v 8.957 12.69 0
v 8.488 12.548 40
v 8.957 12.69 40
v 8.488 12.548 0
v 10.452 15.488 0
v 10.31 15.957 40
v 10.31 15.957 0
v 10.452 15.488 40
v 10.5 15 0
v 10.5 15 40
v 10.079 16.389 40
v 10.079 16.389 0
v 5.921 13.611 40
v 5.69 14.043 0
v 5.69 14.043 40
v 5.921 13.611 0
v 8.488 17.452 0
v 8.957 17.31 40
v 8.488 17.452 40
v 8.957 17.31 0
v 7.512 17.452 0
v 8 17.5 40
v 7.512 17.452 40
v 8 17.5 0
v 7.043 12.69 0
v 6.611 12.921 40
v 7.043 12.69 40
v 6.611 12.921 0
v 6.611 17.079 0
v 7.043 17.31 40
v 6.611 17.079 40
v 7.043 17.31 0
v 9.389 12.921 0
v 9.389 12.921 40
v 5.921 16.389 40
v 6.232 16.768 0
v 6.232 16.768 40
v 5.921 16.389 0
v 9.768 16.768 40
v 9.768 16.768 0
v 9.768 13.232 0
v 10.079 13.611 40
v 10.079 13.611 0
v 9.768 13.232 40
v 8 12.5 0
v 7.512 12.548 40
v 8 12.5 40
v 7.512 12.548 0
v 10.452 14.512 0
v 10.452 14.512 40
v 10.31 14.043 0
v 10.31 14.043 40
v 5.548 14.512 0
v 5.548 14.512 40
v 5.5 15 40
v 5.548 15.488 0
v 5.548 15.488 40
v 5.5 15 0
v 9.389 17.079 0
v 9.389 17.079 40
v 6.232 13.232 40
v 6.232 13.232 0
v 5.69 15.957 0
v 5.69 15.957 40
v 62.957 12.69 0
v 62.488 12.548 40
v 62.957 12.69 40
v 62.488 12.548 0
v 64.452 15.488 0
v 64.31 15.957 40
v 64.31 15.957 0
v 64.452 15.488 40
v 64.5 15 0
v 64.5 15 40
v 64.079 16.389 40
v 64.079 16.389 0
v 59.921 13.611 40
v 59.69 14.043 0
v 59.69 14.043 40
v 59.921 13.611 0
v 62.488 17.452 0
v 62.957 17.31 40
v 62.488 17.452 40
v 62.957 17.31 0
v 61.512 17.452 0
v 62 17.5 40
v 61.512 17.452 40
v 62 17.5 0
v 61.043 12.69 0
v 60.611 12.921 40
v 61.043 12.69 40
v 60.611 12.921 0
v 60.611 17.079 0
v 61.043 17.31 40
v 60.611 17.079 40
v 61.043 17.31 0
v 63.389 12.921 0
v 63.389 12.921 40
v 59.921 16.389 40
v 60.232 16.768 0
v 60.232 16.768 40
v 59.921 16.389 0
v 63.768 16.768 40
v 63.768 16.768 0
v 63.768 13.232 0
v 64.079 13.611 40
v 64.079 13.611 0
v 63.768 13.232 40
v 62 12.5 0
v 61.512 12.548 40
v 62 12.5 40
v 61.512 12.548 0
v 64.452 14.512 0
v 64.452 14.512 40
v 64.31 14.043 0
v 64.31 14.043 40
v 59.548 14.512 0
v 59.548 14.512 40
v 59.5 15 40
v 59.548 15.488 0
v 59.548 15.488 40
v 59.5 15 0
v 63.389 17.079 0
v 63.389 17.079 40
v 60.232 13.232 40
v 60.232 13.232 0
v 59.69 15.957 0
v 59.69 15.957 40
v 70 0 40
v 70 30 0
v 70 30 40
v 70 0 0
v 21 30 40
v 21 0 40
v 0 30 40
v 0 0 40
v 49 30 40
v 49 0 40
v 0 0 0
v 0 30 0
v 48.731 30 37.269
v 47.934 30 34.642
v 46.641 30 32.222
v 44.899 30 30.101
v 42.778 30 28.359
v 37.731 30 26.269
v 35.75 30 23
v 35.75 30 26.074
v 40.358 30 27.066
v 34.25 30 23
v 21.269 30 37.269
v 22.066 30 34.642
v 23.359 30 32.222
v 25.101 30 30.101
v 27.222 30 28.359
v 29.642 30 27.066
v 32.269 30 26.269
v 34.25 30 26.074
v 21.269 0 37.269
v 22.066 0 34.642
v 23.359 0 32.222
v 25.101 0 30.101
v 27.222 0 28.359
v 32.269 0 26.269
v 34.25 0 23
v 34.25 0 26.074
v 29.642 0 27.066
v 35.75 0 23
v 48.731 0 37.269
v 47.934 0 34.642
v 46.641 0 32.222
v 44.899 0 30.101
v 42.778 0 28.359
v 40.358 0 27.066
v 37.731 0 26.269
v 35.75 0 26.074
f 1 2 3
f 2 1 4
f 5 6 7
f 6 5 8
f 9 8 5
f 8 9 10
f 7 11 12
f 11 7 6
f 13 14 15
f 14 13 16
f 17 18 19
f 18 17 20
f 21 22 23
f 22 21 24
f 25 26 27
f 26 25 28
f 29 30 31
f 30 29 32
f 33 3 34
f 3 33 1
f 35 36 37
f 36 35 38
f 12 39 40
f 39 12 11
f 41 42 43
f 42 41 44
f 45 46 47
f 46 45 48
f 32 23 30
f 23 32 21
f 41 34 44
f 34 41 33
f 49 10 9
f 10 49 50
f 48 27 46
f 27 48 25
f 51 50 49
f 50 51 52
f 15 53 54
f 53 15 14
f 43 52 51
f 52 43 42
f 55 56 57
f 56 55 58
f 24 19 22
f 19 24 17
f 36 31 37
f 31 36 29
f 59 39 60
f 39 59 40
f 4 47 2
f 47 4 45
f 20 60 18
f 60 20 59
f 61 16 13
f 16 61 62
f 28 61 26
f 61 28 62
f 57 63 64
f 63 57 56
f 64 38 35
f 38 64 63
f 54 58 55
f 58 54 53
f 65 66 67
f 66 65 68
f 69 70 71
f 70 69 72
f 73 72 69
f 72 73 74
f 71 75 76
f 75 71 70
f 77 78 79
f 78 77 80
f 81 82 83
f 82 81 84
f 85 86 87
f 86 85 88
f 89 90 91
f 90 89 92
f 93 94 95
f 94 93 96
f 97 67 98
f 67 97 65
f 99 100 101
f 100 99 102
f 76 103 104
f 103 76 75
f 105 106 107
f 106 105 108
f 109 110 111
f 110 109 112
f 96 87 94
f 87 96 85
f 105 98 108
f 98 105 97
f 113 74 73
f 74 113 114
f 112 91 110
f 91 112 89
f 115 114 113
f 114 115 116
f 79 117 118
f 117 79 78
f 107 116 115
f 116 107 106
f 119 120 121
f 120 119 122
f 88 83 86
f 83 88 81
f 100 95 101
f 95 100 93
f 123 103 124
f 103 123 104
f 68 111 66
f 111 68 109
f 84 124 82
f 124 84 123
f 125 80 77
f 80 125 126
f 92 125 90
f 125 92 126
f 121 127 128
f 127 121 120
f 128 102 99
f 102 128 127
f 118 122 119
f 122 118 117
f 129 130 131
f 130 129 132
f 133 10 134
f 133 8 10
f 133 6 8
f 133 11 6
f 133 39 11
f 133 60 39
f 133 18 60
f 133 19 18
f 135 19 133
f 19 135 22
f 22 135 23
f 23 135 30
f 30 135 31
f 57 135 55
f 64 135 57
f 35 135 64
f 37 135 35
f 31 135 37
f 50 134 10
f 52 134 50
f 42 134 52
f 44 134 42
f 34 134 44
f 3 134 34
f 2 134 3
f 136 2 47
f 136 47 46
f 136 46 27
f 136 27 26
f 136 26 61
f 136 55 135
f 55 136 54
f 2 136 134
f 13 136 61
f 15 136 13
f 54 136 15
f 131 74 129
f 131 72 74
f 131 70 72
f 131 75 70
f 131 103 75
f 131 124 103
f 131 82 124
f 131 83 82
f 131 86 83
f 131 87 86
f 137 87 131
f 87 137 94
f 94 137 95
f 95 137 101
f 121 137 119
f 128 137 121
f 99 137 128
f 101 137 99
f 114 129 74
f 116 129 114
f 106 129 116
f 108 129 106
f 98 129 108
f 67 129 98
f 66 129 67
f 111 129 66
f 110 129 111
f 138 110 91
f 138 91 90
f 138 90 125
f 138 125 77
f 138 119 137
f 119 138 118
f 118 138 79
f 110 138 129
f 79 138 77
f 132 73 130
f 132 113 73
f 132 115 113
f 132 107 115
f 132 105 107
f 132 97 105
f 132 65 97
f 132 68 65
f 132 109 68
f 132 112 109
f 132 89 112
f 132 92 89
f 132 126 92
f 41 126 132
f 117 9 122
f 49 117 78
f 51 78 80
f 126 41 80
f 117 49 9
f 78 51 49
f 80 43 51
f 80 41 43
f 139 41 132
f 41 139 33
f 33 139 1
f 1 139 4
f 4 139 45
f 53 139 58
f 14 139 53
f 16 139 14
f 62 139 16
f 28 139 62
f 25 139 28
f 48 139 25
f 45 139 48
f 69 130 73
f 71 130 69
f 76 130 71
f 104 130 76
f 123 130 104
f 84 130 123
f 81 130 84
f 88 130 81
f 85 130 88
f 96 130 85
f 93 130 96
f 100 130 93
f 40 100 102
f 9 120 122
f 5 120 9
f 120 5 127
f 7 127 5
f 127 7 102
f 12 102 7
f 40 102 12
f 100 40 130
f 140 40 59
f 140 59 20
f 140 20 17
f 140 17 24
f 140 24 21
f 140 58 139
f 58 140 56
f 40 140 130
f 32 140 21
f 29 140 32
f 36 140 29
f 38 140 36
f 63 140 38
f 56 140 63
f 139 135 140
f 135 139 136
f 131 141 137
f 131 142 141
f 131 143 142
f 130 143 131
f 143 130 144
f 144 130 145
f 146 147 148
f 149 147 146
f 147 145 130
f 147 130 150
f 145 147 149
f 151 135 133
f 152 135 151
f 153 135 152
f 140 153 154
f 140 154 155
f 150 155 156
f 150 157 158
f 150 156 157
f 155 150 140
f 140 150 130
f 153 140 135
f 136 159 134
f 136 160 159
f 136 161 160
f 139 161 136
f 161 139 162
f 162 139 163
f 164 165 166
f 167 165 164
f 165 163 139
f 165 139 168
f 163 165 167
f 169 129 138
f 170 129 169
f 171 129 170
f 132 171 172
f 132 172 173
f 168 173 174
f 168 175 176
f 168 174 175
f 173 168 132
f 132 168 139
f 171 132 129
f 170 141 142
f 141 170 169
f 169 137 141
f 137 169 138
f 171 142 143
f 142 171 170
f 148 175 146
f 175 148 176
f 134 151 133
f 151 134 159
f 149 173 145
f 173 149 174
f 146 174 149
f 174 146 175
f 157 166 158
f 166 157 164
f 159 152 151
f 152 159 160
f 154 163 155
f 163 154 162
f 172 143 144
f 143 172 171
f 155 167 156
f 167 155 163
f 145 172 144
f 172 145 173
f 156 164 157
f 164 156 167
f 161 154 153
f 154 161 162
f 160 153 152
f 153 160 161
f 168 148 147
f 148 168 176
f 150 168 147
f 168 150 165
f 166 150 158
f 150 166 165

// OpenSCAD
$fn = 32;

// ----------------------------------------------------------------------
// Saddle clamp: split shaft clamp
// ----------------------------------------------------------------------

// --- parameters (mm) ---
blk_l = 70;               // block length, X
blk_w = 30;               // block width, Y
blk_h = 40;               // block height
clamp_r = 14;             // shaft groove radius
hole_r = 2.5;             // bolt hole radius
hole_m = 8;               // bolt hole margin from the ends
saw_w = 1.5;              // saw kerf width

saw_depth = clamp_r + 3;  // saw kerf depth

difference() {
  cube([blk_l, blk_w, blk_h]);
  translate([blk_l / 2, -1, blk_h])
    rotate([-90, 0, 0])
      cylinder(h = blk_w + 2, r = clamp_r);
  for (sx = [0, 1])
    translate([sx ? blk_l - hole_m : hole_m, blk_w / 2, -1])
      cylinder(r = hole_r, h = blk_h + 2);
  translate([blk_l / 2 - saw_w / 2, -1, blk_h - saw_depth])
    cube([saw_w, blk_w + 2, saw_depth + 1]);
}
